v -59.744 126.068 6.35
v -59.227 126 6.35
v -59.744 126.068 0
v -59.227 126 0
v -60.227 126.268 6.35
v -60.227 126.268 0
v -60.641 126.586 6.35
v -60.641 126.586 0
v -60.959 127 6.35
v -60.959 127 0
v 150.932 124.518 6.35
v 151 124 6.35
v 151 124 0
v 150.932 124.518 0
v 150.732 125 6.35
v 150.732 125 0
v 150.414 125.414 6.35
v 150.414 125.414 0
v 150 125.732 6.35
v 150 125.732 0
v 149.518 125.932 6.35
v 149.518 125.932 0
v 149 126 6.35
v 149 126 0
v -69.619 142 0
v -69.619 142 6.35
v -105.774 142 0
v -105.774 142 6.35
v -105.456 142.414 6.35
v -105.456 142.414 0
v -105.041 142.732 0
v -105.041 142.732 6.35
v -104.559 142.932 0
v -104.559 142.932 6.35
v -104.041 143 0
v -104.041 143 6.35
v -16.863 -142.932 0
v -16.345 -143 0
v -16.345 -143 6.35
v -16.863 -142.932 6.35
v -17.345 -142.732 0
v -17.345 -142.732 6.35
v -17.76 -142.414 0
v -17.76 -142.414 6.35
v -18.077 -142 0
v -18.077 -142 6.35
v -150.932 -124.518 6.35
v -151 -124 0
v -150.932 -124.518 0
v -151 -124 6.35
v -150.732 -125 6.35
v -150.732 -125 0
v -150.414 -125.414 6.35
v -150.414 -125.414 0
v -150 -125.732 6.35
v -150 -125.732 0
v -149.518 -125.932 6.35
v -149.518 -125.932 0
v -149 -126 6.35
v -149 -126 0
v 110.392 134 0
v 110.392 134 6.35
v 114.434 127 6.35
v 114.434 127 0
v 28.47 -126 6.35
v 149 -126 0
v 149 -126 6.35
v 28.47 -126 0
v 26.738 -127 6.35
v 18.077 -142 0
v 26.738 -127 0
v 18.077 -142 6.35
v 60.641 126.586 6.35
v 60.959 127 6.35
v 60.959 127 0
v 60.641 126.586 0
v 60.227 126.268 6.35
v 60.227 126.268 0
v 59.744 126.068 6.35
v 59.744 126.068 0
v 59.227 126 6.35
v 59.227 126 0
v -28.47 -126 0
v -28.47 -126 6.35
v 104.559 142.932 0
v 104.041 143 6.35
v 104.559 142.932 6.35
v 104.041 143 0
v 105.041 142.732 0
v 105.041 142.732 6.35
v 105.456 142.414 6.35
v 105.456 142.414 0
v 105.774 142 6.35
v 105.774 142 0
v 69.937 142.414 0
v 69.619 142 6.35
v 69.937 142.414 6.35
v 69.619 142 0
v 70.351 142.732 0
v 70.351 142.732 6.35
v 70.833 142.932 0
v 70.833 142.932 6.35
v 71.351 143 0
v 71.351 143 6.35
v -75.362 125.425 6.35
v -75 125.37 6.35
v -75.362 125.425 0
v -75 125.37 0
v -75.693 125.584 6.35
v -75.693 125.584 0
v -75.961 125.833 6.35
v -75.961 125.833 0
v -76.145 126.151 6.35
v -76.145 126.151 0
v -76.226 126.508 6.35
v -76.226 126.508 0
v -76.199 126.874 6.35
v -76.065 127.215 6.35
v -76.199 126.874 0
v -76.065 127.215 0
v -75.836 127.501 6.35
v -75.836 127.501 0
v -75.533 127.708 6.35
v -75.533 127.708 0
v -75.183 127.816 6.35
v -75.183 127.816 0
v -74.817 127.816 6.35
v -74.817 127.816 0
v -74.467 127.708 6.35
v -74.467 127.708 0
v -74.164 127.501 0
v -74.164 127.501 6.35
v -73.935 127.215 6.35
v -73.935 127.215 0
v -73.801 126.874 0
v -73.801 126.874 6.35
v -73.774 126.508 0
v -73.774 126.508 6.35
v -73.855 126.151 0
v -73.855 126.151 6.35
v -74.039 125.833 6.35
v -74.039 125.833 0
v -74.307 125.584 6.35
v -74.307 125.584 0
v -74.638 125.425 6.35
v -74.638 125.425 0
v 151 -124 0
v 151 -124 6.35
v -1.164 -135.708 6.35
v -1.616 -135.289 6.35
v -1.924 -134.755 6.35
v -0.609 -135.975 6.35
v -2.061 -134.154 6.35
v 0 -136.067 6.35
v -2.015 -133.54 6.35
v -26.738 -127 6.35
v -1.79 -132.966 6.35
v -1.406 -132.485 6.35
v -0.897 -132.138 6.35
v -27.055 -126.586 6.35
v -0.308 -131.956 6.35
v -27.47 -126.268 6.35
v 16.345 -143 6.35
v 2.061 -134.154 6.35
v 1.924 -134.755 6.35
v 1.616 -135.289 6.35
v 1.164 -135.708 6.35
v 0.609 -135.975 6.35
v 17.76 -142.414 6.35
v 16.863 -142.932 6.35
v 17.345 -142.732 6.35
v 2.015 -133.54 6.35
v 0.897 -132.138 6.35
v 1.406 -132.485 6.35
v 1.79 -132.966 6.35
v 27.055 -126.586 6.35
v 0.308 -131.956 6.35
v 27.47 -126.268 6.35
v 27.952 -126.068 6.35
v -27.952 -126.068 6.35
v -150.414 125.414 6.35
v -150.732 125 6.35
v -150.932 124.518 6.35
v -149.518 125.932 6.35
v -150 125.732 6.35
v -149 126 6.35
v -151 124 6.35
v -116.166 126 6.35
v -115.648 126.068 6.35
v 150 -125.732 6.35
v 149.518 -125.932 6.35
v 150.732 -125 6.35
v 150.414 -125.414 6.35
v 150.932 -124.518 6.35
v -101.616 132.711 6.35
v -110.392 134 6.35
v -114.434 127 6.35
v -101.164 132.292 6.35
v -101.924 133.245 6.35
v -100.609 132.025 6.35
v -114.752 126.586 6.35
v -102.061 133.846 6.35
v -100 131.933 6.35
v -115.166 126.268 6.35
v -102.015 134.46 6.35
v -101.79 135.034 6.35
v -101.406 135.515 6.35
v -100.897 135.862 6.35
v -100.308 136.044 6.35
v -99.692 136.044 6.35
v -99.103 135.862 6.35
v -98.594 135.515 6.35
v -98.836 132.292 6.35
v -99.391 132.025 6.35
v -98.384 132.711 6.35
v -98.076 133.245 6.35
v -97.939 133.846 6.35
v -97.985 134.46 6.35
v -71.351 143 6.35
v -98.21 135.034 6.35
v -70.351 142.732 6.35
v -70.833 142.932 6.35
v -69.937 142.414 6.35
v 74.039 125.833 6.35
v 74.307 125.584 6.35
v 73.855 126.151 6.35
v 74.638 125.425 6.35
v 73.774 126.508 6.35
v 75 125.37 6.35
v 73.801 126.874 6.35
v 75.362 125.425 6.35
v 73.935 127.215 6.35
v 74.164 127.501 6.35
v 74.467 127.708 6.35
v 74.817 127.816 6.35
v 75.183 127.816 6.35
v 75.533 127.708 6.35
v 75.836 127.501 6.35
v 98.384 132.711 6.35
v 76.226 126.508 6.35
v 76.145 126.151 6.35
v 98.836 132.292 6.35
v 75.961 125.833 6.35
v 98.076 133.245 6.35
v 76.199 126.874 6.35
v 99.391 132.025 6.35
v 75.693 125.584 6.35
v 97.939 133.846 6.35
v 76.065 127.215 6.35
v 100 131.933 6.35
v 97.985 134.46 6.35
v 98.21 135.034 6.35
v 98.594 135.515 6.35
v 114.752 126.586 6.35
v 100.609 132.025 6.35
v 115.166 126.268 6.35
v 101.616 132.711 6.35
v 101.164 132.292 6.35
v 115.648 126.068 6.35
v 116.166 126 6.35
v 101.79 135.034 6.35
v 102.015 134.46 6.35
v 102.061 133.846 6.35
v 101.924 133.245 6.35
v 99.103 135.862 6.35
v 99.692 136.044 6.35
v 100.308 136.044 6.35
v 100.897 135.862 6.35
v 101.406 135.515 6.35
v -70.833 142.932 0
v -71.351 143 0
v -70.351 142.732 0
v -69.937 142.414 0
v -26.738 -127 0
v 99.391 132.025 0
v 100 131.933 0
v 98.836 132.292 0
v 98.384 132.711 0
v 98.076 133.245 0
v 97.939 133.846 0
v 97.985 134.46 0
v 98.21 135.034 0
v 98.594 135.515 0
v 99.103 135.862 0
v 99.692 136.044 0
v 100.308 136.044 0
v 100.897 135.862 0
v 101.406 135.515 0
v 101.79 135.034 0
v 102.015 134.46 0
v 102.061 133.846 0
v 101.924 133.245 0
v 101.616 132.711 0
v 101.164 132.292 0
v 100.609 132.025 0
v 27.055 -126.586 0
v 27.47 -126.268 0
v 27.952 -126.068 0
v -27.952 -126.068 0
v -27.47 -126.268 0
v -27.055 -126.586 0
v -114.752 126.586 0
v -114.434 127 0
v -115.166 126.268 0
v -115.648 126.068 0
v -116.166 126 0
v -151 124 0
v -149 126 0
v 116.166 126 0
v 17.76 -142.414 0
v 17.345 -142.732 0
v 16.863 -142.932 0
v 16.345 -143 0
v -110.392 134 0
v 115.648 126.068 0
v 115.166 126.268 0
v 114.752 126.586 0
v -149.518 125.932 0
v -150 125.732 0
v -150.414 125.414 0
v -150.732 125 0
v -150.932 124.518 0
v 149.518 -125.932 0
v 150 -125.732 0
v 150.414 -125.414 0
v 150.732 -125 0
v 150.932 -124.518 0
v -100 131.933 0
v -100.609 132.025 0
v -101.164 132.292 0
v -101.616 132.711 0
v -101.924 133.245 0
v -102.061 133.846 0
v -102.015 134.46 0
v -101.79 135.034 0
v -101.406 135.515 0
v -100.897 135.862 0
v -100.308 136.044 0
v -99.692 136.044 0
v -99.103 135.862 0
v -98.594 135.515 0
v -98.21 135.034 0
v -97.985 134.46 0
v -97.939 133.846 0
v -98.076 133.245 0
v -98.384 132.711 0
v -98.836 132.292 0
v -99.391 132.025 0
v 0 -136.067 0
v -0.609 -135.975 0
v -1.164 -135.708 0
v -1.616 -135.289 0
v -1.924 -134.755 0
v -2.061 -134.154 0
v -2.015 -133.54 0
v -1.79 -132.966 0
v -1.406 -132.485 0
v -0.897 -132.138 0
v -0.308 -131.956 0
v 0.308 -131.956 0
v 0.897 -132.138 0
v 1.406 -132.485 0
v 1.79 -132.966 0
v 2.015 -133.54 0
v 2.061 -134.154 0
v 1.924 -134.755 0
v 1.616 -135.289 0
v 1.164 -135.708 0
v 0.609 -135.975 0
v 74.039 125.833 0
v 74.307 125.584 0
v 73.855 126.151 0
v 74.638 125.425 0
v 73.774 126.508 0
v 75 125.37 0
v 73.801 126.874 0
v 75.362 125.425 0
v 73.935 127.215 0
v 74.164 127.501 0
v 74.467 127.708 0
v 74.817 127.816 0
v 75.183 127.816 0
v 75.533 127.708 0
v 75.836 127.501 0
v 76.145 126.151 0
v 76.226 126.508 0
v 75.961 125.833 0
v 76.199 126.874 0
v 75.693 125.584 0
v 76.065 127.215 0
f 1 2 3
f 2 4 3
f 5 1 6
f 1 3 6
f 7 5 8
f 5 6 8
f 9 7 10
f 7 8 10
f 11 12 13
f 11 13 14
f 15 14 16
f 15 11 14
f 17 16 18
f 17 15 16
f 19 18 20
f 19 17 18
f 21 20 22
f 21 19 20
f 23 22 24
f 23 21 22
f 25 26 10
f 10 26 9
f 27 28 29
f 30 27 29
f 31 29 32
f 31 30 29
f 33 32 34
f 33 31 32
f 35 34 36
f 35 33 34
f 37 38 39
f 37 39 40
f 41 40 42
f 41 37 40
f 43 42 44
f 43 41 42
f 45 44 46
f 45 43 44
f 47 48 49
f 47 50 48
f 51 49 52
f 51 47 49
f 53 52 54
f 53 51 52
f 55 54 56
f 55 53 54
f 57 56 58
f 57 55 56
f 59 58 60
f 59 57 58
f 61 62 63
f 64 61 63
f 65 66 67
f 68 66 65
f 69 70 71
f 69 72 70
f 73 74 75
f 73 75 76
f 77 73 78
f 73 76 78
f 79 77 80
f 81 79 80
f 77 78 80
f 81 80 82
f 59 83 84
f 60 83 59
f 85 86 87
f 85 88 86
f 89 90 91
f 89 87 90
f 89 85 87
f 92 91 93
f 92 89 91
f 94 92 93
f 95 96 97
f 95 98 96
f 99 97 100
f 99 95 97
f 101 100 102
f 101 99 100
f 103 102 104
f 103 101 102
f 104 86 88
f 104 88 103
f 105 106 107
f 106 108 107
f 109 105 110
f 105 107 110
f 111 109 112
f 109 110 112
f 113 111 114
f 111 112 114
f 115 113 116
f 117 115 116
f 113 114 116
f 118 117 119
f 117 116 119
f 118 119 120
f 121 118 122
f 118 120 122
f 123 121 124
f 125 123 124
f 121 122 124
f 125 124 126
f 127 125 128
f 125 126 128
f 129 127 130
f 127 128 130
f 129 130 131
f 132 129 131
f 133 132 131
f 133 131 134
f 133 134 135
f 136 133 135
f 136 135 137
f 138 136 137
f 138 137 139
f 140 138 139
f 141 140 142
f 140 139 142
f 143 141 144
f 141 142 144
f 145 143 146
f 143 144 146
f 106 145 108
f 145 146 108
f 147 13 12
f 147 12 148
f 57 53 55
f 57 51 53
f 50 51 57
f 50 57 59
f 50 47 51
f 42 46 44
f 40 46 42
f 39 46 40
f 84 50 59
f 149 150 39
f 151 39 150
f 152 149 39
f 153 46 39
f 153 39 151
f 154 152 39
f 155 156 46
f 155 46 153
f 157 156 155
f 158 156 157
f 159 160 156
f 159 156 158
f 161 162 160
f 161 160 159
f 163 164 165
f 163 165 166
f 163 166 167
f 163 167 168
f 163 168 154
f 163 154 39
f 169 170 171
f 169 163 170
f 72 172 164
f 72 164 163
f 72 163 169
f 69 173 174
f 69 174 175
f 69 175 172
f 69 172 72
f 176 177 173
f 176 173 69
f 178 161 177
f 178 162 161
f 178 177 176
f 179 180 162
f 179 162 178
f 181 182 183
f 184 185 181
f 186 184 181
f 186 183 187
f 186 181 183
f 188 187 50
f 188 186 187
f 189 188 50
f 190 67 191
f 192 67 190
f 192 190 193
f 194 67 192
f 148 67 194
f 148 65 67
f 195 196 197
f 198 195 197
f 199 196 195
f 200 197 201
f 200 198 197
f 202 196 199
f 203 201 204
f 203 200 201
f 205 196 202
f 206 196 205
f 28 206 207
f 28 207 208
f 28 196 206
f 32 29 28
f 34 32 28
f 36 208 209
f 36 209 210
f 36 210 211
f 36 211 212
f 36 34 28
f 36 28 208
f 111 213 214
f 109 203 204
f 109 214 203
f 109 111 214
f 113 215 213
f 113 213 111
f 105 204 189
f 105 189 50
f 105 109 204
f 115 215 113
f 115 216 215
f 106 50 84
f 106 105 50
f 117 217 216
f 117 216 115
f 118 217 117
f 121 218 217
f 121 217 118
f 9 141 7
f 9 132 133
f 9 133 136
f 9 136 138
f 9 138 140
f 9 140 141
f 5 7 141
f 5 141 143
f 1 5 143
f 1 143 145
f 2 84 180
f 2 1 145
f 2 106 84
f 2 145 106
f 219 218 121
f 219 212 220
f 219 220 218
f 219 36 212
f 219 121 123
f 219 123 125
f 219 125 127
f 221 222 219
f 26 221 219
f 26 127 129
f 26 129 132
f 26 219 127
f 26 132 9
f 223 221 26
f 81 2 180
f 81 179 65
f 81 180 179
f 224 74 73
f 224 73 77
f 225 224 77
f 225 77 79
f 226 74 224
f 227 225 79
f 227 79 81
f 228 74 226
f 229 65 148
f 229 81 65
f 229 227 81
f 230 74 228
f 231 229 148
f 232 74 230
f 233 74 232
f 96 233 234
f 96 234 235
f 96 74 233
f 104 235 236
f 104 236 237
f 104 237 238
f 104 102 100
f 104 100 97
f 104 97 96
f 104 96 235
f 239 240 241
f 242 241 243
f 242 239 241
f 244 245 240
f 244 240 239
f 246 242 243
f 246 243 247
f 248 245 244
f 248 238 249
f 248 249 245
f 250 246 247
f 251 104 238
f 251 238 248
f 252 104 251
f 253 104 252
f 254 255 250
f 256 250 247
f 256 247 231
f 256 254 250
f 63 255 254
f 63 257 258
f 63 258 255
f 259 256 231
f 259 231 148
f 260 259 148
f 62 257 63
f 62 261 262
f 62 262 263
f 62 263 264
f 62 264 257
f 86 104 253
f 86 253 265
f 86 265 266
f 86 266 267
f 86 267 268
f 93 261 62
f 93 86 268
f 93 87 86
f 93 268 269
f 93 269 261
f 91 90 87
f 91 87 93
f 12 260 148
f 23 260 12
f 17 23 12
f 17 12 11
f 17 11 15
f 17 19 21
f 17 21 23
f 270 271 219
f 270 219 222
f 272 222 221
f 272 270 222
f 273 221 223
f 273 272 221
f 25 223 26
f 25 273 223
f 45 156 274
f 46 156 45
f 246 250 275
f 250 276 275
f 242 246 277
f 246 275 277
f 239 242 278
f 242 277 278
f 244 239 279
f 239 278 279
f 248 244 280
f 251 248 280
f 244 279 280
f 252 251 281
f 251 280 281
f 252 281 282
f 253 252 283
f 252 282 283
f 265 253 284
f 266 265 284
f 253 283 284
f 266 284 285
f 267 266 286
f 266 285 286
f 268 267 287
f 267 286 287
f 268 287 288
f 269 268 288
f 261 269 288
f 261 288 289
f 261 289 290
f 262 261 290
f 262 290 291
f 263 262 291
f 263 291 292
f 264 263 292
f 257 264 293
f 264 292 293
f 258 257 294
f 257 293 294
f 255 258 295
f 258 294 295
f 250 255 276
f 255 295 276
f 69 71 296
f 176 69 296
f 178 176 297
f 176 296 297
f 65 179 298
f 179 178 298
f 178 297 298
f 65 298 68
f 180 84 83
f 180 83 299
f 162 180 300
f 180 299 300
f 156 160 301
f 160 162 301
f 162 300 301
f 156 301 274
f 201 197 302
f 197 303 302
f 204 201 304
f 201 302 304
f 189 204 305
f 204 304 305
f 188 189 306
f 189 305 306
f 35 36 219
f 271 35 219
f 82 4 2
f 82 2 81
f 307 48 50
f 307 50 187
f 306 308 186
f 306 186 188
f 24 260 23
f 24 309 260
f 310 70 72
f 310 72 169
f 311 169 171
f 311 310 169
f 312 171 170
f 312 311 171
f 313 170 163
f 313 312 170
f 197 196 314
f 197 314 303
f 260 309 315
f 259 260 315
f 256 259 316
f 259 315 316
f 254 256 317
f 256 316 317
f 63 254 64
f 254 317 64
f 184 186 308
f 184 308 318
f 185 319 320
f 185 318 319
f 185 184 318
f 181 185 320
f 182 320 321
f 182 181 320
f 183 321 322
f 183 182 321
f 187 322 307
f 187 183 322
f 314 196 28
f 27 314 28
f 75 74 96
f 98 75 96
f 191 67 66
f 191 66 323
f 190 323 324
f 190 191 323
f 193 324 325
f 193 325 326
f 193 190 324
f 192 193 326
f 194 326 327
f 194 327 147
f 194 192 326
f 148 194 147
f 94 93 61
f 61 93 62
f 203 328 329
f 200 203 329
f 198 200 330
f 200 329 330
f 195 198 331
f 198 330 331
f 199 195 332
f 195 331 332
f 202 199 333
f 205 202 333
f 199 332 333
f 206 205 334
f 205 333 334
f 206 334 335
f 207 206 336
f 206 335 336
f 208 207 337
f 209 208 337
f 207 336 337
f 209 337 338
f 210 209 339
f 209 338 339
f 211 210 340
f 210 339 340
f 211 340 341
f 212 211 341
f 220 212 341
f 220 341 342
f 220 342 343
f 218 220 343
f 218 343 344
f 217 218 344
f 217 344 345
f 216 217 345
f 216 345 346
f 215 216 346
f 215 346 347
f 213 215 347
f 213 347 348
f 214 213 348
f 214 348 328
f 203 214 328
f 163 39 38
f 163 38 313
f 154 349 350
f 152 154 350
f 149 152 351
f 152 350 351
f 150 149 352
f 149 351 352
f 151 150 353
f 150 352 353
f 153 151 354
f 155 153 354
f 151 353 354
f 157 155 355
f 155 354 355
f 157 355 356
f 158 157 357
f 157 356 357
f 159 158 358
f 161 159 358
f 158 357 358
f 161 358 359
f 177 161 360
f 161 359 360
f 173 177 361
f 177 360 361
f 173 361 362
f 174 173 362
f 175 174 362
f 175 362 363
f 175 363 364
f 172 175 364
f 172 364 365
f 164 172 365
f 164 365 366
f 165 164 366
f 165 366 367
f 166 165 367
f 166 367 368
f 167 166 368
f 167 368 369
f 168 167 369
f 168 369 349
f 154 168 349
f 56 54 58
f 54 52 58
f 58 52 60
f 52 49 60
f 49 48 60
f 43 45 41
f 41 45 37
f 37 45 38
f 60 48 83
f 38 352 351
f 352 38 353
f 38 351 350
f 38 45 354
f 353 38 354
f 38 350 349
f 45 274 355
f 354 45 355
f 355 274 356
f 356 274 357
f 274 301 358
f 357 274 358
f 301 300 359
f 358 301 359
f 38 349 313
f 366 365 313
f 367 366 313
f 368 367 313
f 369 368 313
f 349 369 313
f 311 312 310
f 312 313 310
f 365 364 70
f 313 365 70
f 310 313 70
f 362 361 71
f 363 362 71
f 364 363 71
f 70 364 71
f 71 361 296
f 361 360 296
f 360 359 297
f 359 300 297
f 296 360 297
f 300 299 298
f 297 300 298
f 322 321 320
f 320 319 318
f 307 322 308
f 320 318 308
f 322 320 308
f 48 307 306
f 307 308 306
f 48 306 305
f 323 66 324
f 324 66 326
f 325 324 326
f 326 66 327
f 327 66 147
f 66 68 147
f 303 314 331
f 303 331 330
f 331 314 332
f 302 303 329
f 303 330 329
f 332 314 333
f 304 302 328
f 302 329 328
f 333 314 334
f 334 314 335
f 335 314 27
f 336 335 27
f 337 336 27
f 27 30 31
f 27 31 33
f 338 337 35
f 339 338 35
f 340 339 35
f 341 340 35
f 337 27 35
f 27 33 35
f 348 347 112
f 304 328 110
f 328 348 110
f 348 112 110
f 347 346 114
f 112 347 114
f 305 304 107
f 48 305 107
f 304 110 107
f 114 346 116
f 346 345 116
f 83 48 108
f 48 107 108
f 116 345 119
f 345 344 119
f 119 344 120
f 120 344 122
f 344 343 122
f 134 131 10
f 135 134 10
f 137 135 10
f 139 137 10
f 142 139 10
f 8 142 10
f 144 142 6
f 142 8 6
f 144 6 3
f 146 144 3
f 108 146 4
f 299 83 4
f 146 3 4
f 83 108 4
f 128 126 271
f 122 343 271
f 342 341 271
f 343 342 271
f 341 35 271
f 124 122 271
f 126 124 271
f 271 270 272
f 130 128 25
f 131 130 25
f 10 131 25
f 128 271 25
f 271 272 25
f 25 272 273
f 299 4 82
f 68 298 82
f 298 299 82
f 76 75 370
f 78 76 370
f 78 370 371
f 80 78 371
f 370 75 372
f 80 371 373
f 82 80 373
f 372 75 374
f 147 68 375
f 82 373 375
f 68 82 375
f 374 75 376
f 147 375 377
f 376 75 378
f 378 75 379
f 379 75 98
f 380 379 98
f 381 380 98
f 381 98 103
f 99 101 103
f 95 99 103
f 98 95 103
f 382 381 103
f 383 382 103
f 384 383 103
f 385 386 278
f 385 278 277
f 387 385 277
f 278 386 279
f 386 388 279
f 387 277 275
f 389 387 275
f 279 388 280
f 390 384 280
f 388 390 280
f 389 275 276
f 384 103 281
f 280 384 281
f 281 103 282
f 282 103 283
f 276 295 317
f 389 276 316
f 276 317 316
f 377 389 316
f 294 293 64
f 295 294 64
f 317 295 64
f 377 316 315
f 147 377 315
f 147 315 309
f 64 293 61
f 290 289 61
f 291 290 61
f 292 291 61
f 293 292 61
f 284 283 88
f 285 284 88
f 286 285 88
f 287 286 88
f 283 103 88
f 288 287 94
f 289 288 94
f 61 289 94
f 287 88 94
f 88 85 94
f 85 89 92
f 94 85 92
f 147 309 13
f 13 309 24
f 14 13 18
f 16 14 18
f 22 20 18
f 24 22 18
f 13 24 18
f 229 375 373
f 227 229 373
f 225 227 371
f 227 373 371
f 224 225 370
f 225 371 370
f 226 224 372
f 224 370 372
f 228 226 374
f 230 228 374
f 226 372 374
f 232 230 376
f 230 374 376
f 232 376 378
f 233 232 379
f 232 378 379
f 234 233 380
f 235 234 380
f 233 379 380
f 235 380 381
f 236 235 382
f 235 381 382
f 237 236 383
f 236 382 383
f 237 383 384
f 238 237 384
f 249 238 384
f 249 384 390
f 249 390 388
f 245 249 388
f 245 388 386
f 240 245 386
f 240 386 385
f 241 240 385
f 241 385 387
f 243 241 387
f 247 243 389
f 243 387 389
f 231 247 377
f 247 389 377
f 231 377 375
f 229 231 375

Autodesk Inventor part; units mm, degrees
ref_plane "YZ Plane" through (0, 0, 0) normal (1, 0, 0) x (0, 1, 0)
ref_plane "XZ Plane" through (0, 0, 0) normal (0, 1, 0) x (-1, 0, 0)
ref_plane "XY Plane" through (0, 0, 0) normal (0, 0, 1) x (1, 0, 0)
sketch "Sketch1" plane through (0, 0, 0) normal (0, 0, 1) x (1, 0, 0)
  line L0 (151, -126) -> (-151, -126)
  line L1 (-151, -126) -> (-151, 126)
  line L2 (-151, 126) -> (151, 126)
  line L3 (151, 126) -> (151, -126)
  line L4 (151, -126) -> (-151, 126) construction
  line L5 (-151, -126) -> (151, 126) construction
  point P0 (0, 0)
  dimension "d0" = 302
  dimension "d1" = 252
extrude "Extrusion1" add sketch "Sketch1" along normal blind 6.35
sketch "Sketch2" plane through (0, 0, 6.35) normal (0, 0, 1) x (1, 0, 0)
  line L0 (-110.3923, 134) -> (-105.1962, 143)
  line L1 (-105.1962, 143) -> (-94.8038, 143)
  line L2 (-94.8038, 143) -> (-89.6077, 134)
  line L3 (-89.6077, 134) -> (-94.8038, 125)
  line L4 (-94.8038, 125) -> (-105.1962, 125)
  line L5 (-105.1962, 125) -> (-110.3923, 134)
  line L6 (94.8038, 143) -> (105.1962, 143)
  line L7 (105.1962, 143) -> (110.3923, 134)
  line L8 (110.3923, 134) -> (105.1962, 125)
  line L9 (105.1962, 125) -> (94.8038, 125)
  line L10 (94.8038, 125) -> (89.6077, 134)
  line L11 (89.6077, 134) -> (94.8038, 143)
  line L12 (-100, 134) -> (100, 134) construction
  line L13 (151, 126) -> (-151, 126) projected
  line L14 (-105.1962, 143) -> (-115.0111, 126)
  line L15 (105.1962, 143) -> (115.0111, 126)
  line L16 (94.8038, 143) -> (-94.8038, 143)
  line L17 (-151, -126) -> (151, -126) projected
  line L18 (-27.315, -126) -> (-17.5, -143)
  line L19 (-17.5, -143) -> (17.5, -143)
  line L20 (17.5, -143) -> (27.315, -126)
  line L21 (-70.1962, 143) -> (-60.3812, 126)
  line L22 (60.3812, 126) -> (70.1962, 143)
  point P0 (0, 0)
  point P1 (0, 134)
  point P2 (0, -143)
  point P3 (0, -134)
  dimension "d4" = 18
  dimension "d5" = 200
  dimension "d6" = 8
  dimension "d7" = 17
  dimension "d8" = 17
  dimension "d9" = 35
  dimension "d10" = 8
  dimension "d32" = 35
  dimension "d33" = 35
extrude "Extrusion2" add sketch "Sketch2" against normal up to surface (6.35 mm away) contours L0 L1 L2 L3 L13 L5 | L5 L13 L14 | L16 L21 L13 L3 L2 | L16 L11 L10 L13 L22 | L6 L7 L8 L13 L10 L11 | L8 L15 L13 | L17 L20 L19 L18
hole "Hole1" at (0, -134, 6.35) at (-100, 134, 6.35) at (100, 134, 6.35) direction (0, 0, -1) diameter 4.134 end through all thread size "M5x0.8" class "6H" standard "ANSI Metric M Profile"
fillet "Fillet1" radius 2 16 edges at (17.5, -143, 3.175) (27.315, -126, 3.175) (151, -126, 3.175) (-151, 126, 3.175) (115.0111, 126, 3.175) (105.1962, 143, 3.175) (151, 126, 3.175) (-27.315, -126, 3.175) (-17.5, -143, 3.175) (-151, -126, 3.175) (-115.0111, 126, 3.175) (-105.1962, 143, 3.175) (-70.1962, 143, 3.175) (-60.3812, 126, 3.175) (60.3812, 126, 3.175) (70.1962, 143, 3.175)
sketch "Sketch3" plane through (0, 0, 6.35) normal (0, 0, 1) x (1, 0, 0)
  line L0 (150, -125) -> (-150, -125) construction
  line L1 (-150, -125) -> (-150, 125) construction
  line L2 (-150, 125) -> (150, 125) construction
  line L3 (150, 125) -> (150, -125) construction
  line L4 (150, -125) -> (-150, 125) construction
  line L5 (-150, -125) -> (150, 125) construction
  circle A0 centre (-75, 126.6) radius 1.6 construction
  line L6 (-75, 126.6) -> (75, 126.6) construction
  circle A1 centre (75, 126.6) radius 1.6 construction
  point P0 (0, 0)
  point P1 (0, 126.6)
  dimension "d21" = 300
  dimension "d22" = 250
  dimension "d23" = 3.2
  dimension "d24" = 150
hole "Hole2" at (-75, 126.6, 6.35) at (75, 126.6, 6.35) direction (0, 0, -1) diameter 2.459 end through all thread size "M3x0.5" class "6H" standard "ANSI Metric M Profile"
equation "\"d7\" = d8"
equation "\"d10\" = d6"
equation "\"d32\" = d9"
equation "\"d33\" = d32"
properties part number "Print Bed" material "Aluminum 6061"
